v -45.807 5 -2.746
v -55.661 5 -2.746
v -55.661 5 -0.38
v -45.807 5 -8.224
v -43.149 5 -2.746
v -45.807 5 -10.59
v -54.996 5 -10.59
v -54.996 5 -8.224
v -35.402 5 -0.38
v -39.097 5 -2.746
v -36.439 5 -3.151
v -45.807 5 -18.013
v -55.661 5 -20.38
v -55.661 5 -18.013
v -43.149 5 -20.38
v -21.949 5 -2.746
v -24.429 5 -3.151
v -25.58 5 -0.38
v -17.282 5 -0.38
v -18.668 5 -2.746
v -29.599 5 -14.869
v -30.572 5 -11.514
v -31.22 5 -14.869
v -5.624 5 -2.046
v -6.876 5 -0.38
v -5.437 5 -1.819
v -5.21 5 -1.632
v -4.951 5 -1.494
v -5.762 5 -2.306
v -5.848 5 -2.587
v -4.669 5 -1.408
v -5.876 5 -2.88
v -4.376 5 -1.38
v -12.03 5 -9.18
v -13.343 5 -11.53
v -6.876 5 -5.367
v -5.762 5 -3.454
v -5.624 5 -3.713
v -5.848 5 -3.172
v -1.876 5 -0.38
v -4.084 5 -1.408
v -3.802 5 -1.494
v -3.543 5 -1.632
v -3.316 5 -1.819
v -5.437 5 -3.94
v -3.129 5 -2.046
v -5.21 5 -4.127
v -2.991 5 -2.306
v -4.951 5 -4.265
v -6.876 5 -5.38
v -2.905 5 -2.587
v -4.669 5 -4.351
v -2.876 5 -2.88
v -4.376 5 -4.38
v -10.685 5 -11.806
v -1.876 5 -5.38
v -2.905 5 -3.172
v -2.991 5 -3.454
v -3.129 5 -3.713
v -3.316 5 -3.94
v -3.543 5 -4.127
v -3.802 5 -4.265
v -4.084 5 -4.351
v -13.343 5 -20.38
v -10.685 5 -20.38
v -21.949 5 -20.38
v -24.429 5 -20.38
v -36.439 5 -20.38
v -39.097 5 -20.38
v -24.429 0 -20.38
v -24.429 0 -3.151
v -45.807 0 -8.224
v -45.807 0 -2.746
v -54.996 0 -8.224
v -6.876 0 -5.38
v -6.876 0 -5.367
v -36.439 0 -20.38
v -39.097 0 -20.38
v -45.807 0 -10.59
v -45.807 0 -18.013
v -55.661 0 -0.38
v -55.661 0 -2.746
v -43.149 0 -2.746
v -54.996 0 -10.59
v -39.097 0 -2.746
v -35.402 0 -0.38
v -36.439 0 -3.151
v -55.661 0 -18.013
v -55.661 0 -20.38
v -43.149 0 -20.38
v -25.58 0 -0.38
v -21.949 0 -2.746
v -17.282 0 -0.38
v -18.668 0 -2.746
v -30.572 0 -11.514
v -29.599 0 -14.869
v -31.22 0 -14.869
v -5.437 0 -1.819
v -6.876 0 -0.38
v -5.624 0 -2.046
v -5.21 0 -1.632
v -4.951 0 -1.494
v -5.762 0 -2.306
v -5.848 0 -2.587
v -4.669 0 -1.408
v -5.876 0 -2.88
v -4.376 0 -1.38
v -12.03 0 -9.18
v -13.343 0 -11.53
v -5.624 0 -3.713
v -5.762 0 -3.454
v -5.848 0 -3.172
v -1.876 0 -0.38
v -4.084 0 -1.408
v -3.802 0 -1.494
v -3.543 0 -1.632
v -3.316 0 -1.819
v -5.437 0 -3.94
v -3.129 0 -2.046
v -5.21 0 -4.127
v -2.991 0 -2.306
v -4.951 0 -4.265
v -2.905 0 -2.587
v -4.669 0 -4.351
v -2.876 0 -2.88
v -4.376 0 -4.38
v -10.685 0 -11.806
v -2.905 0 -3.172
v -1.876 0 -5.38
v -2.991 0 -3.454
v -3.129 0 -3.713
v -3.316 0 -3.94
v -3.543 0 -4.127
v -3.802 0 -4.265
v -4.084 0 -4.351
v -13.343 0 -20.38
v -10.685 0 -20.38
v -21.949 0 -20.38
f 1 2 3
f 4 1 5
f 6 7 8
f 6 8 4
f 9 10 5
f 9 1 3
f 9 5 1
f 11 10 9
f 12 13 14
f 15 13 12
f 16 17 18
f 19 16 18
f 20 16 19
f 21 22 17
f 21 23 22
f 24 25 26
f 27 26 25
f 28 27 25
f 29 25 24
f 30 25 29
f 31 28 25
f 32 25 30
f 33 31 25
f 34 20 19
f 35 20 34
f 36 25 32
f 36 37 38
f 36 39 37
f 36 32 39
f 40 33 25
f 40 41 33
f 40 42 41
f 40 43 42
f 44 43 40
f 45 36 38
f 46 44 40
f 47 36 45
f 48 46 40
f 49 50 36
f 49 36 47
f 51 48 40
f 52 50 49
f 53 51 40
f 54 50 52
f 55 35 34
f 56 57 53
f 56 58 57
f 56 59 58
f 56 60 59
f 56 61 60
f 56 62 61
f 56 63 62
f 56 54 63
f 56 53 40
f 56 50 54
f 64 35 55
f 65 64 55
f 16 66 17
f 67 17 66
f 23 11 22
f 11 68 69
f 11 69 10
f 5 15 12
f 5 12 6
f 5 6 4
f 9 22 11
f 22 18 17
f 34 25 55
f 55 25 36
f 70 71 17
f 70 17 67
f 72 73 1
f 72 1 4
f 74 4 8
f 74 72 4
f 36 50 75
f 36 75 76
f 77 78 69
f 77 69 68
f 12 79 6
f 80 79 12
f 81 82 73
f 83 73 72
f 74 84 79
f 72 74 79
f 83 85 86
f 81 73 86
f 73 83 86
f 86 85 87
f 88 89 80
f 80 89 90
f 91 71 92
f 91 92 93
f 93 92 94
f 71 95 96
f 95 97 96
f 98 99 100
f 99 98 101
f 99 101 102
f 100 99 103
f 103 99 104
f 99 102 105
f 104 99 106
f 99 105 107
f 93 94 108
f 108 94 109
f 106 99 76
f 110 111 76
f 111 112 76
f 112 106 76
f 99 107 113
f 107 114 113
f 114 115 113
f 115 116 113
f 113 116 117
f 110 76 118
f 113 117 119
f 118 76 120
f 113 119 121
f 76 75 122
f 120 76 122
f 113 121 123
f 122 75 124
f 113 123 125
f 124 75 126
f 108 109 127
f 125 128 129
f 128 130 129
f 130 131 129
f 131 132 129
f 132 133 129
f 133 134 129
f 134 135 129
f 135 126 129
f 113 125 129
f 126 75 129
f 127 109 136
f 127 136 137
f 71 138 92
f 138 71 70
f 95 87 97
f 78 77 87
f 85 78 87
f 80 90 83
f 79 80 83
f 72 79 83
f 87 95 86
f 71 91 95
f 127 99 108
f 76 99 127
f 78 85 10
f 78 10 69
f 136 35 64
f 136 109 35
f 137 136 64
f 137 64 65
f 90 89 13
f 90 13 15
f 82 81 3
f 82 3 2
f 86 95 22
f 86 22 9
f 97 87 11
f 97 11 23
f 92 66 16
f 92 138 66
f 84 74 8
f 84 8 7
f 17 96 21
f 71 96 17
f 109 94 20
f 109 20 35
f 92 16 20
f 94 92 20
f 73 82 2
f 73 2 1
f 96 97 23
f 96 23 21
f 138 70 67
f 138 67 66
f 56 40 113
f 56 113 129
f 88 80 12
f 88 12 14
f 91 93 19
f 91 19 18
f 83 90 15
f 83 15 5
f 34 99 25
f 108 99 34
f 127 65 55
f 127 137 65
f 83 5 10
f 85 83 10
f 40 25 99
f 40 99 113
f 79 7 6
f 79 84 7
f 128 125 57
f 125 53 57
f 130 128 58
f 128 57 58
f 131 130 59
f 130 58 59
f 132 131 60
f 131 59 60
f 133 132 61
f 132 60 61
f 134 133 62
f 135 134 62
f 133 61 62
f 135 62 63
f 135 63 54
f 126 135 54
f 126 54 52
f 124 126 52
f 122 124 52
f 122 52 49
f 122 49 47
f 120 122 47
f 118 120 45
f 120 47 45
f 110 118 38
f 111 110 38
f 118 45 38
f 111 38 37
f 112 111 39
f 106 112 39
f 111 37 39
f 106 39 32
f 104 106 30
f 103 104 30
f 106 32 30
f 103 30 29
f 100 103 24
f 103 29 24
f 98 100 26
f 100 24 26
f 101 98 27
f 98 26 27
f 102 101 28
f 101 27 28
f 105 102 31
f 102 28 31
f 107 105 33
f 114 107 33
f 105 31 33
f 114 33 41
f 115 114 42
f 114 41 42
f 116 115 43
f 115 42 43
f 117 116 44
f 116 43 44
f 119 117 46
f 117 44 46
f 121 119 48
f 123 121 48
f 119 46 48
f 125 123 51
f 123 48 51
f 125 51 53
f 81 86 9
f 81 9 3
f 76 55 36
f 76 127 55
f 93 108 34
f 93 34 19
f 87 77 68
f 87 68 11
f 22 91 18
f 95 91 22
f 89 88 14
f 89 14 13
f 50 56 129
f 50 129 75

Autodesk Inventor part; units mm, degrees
ref_plane "YZ Plane" through (0, 0, 0) normal (1, 0, 0) x (0, 1, 0)
ref_plane "XZ Plane" through (0, 0, 0) normal (0, 1, 0) x (-1, 0, 0)
ref_plane "XY Plane" through (0, 0, 0) normal (0, 0, 1) x (1, 0, 0)
sketch "Sketch1" plane through (0, 0, 0) normal (0, 1, 0) x (-1, 0, 0)
  line L0 (4.0726, -0.3796) -> (56.5523, -0.3796) construction
  line L1 (56.5523, -0.3796) -> (56.5523, -20.3796) construction
  line L2 (56.5523, -20.3796) -> (4.0726, -20.3796) construction
  line L3 (4.0726, -20.3796) -> (4.0726, -0.3796) construction
  line L4 (20.1018, -0.3796) -> (13.3433, -11.5303)
  line L5 (13.3433, -11.5303) -> (13.3433, -20.3796)
  line L6 (13.3433, -20.3796) -> (10.6852, -20.3796)
  line L7 (10.6852, -20.3796) -> (10.6852, -11.8059)
  line L8 (10.6852, -11.8059) -> (3.9267, -0.3796)
  line L9 (3.9267, -0.3796) -> (6.8765, -0.3796)
  line L10 (6.8765, -0.3796) -> (12.0305, -9.1803)
  line L11 (12.0305, -9.1803) -> (17.2817, -0.3796)
  line L12 (17.2817, -0.3796) -> (20.1018, -0.3796)
  line L13 (39.0969, -20.3796) -> (36.4389, -20.3796)
  line L14 (36.4389, -20.3796) -> (36.4389, -3.1511)
  line L15 (36.4389, -3.1511) -> (31.2201, -14.8691)
  line L16 (31.2201, -14.8691) -> (29.5993, -14.8691)
  line L17 (29.5993, -14.8691) -> (24.4292, -3.1511)
  line L18 (24.4292, -3.1511) -> (24.4292, -20.3796)
  line L19 (24.4292, -20.3796) -> (21.9494, -20.3796)
  line L20 (21.9494, -20.3796) -> (21.9494, -0.3796)
  line L21 (21.9494, -0.3796) -> (25.5799, -0.3796)
  line L22 (25.5799, -0.3796) -> (30.5718, -11.5141)
  line L23 (30.5718, -11.5141) -> (35.4016, -0.3796)
  line L24 (35.4016, -0.3796) -> (39.0969, -0.3796)
  line L25 (39.0969, -0.3796) -> (39.0969, -20.3796)
  line L26 (43.1488, -20.3796) -> (43.1488, -0.3796)
  line L27 (43.1488, -0.3796) -> (55.6609, -0.3796)
  line L28 (55.6609, -0.3796) -> (55.6609, -2.7459)
  line L29 (55.6609, -2.7459) -> (45.8068, -2.7459)
  line L30 (45.8068, -2.7459) -> (45.8068, -8.224)
  line L31 (45.8068, -8.224) -> (54.9964, -8.224)
  line L32 (54.9964, -8.224) -> (54.9964, -10.5903)
  line L33 (54.9964, -10.5903) -> (45.8068, -10.5903)
  line L34 (45.8068, -10.5903) -> (45.8068, -18.0133)
  line L35 (45.8068, -18.0133) -> (55.6609, -18.0133)
  line L36 (55.6609, -18.0133) -> (55.6609, -20.3796)
  line L37 (55.6609, -20.3796) -> (43.1488, -20.3796)
  point P0 (0, 0)
extrude "Extrusion1" add sketch "Sketch1" along normal blind 5
sketch "Sketch2" plane through (0, 5, 0) normal (0, 1, 0) x (1, 0, 0)
  line L0 (-17.2817, 0.3796) -> (-12.0305, 9.1803) projected
  line L1 (-55.6609, 0.3796) -> (-43.1488, 0.3796) projected
  line L2 (-17.2817, 0.3796) -> (-20.1018, 0.3796)
  line L3 (-55.6609, 2.7459) -> (-55.6609, 0.3796) projected
  line L4 (-55.6609, 0.3796) -> (-55.6609, 2.7459)
  line L5 (-55.6609, 2.7459) -> (-16.2934, 2.7459)
  line L6 (-16.2934, 2.7459) -> (-17.3426, 0.3796)
  line L7 (-13.3433, 11.5303) -> (-20.1018, 0.3796) projected
  line L8 (-20.1018, 0.3796) -> (-24.9933, 0.3796)
  line L9 (-21.9494, 0.3796) -> (-25.5799, 0.3796) projected
  line L10 (-26.1142, 2.7459) -> (-24.9933, 0.3796)
  line L11 (-55.6609, 0.3796) -> (-38.2567, 0.3796)
  line L12 (-39.0969, 0.3796) -> (-35.4016, 0.3796) projected
  line L13 (-38.2567, 2.7459) -> (-49.9322, 2.7459)
  line L14 (-38.2567, 0.3796) -> (-38.2567, 2.7459)
  point P0 (0, 0)
extrude "Extrusion2" add sketch "Sketch2" against normal blind 5
sketch "Sketch3" plane through (0, 5, 0) normal (0, 1, 0) x (1, 0, 0)
  line L0 (-6.8765, 0.3796) -> (-3.9267, 0.3796) projected
  line L1 (-6.8765, 0.3796) -> (-1.8765, 0.3796)
  line L2 (-1.8765, 0.3796) -> (-1.8765, 5.3796)
  line L3 (-1.8765, 5.3796) -> (-6.8765, 5.3796)
  line L4 (-6.8765, 5.3796) -> (-6.8765, 0.3796)
  point P0 (0, 0)
  dimension "d9" = 5
  dimension "d10" = 5
extrude "Extrusion3" add sketch "Sketch3" against normal blind 5
sketch "Sketch4" plane through (0, 5, 0) normal (0, 1, 0) x (1, 0, 0)
  circle A0 centre (-4.3765, 2.8796) radius 1.5
  line L0 (-6.8765, 0.3796) -> (-1.8765, 0.3796) projected
  line L1 (-1.8765, 0.3796) -> (-1.8765, 5.3796) projected
  point P0 (0, 0)
  dimension "d6" = 2.5
  dimension "d11" = 2.5
  dimension "d12" = 3
extrude "Extrusion4" cut sketch "Sketch4" against normal blind 5
properties part number "YME"
